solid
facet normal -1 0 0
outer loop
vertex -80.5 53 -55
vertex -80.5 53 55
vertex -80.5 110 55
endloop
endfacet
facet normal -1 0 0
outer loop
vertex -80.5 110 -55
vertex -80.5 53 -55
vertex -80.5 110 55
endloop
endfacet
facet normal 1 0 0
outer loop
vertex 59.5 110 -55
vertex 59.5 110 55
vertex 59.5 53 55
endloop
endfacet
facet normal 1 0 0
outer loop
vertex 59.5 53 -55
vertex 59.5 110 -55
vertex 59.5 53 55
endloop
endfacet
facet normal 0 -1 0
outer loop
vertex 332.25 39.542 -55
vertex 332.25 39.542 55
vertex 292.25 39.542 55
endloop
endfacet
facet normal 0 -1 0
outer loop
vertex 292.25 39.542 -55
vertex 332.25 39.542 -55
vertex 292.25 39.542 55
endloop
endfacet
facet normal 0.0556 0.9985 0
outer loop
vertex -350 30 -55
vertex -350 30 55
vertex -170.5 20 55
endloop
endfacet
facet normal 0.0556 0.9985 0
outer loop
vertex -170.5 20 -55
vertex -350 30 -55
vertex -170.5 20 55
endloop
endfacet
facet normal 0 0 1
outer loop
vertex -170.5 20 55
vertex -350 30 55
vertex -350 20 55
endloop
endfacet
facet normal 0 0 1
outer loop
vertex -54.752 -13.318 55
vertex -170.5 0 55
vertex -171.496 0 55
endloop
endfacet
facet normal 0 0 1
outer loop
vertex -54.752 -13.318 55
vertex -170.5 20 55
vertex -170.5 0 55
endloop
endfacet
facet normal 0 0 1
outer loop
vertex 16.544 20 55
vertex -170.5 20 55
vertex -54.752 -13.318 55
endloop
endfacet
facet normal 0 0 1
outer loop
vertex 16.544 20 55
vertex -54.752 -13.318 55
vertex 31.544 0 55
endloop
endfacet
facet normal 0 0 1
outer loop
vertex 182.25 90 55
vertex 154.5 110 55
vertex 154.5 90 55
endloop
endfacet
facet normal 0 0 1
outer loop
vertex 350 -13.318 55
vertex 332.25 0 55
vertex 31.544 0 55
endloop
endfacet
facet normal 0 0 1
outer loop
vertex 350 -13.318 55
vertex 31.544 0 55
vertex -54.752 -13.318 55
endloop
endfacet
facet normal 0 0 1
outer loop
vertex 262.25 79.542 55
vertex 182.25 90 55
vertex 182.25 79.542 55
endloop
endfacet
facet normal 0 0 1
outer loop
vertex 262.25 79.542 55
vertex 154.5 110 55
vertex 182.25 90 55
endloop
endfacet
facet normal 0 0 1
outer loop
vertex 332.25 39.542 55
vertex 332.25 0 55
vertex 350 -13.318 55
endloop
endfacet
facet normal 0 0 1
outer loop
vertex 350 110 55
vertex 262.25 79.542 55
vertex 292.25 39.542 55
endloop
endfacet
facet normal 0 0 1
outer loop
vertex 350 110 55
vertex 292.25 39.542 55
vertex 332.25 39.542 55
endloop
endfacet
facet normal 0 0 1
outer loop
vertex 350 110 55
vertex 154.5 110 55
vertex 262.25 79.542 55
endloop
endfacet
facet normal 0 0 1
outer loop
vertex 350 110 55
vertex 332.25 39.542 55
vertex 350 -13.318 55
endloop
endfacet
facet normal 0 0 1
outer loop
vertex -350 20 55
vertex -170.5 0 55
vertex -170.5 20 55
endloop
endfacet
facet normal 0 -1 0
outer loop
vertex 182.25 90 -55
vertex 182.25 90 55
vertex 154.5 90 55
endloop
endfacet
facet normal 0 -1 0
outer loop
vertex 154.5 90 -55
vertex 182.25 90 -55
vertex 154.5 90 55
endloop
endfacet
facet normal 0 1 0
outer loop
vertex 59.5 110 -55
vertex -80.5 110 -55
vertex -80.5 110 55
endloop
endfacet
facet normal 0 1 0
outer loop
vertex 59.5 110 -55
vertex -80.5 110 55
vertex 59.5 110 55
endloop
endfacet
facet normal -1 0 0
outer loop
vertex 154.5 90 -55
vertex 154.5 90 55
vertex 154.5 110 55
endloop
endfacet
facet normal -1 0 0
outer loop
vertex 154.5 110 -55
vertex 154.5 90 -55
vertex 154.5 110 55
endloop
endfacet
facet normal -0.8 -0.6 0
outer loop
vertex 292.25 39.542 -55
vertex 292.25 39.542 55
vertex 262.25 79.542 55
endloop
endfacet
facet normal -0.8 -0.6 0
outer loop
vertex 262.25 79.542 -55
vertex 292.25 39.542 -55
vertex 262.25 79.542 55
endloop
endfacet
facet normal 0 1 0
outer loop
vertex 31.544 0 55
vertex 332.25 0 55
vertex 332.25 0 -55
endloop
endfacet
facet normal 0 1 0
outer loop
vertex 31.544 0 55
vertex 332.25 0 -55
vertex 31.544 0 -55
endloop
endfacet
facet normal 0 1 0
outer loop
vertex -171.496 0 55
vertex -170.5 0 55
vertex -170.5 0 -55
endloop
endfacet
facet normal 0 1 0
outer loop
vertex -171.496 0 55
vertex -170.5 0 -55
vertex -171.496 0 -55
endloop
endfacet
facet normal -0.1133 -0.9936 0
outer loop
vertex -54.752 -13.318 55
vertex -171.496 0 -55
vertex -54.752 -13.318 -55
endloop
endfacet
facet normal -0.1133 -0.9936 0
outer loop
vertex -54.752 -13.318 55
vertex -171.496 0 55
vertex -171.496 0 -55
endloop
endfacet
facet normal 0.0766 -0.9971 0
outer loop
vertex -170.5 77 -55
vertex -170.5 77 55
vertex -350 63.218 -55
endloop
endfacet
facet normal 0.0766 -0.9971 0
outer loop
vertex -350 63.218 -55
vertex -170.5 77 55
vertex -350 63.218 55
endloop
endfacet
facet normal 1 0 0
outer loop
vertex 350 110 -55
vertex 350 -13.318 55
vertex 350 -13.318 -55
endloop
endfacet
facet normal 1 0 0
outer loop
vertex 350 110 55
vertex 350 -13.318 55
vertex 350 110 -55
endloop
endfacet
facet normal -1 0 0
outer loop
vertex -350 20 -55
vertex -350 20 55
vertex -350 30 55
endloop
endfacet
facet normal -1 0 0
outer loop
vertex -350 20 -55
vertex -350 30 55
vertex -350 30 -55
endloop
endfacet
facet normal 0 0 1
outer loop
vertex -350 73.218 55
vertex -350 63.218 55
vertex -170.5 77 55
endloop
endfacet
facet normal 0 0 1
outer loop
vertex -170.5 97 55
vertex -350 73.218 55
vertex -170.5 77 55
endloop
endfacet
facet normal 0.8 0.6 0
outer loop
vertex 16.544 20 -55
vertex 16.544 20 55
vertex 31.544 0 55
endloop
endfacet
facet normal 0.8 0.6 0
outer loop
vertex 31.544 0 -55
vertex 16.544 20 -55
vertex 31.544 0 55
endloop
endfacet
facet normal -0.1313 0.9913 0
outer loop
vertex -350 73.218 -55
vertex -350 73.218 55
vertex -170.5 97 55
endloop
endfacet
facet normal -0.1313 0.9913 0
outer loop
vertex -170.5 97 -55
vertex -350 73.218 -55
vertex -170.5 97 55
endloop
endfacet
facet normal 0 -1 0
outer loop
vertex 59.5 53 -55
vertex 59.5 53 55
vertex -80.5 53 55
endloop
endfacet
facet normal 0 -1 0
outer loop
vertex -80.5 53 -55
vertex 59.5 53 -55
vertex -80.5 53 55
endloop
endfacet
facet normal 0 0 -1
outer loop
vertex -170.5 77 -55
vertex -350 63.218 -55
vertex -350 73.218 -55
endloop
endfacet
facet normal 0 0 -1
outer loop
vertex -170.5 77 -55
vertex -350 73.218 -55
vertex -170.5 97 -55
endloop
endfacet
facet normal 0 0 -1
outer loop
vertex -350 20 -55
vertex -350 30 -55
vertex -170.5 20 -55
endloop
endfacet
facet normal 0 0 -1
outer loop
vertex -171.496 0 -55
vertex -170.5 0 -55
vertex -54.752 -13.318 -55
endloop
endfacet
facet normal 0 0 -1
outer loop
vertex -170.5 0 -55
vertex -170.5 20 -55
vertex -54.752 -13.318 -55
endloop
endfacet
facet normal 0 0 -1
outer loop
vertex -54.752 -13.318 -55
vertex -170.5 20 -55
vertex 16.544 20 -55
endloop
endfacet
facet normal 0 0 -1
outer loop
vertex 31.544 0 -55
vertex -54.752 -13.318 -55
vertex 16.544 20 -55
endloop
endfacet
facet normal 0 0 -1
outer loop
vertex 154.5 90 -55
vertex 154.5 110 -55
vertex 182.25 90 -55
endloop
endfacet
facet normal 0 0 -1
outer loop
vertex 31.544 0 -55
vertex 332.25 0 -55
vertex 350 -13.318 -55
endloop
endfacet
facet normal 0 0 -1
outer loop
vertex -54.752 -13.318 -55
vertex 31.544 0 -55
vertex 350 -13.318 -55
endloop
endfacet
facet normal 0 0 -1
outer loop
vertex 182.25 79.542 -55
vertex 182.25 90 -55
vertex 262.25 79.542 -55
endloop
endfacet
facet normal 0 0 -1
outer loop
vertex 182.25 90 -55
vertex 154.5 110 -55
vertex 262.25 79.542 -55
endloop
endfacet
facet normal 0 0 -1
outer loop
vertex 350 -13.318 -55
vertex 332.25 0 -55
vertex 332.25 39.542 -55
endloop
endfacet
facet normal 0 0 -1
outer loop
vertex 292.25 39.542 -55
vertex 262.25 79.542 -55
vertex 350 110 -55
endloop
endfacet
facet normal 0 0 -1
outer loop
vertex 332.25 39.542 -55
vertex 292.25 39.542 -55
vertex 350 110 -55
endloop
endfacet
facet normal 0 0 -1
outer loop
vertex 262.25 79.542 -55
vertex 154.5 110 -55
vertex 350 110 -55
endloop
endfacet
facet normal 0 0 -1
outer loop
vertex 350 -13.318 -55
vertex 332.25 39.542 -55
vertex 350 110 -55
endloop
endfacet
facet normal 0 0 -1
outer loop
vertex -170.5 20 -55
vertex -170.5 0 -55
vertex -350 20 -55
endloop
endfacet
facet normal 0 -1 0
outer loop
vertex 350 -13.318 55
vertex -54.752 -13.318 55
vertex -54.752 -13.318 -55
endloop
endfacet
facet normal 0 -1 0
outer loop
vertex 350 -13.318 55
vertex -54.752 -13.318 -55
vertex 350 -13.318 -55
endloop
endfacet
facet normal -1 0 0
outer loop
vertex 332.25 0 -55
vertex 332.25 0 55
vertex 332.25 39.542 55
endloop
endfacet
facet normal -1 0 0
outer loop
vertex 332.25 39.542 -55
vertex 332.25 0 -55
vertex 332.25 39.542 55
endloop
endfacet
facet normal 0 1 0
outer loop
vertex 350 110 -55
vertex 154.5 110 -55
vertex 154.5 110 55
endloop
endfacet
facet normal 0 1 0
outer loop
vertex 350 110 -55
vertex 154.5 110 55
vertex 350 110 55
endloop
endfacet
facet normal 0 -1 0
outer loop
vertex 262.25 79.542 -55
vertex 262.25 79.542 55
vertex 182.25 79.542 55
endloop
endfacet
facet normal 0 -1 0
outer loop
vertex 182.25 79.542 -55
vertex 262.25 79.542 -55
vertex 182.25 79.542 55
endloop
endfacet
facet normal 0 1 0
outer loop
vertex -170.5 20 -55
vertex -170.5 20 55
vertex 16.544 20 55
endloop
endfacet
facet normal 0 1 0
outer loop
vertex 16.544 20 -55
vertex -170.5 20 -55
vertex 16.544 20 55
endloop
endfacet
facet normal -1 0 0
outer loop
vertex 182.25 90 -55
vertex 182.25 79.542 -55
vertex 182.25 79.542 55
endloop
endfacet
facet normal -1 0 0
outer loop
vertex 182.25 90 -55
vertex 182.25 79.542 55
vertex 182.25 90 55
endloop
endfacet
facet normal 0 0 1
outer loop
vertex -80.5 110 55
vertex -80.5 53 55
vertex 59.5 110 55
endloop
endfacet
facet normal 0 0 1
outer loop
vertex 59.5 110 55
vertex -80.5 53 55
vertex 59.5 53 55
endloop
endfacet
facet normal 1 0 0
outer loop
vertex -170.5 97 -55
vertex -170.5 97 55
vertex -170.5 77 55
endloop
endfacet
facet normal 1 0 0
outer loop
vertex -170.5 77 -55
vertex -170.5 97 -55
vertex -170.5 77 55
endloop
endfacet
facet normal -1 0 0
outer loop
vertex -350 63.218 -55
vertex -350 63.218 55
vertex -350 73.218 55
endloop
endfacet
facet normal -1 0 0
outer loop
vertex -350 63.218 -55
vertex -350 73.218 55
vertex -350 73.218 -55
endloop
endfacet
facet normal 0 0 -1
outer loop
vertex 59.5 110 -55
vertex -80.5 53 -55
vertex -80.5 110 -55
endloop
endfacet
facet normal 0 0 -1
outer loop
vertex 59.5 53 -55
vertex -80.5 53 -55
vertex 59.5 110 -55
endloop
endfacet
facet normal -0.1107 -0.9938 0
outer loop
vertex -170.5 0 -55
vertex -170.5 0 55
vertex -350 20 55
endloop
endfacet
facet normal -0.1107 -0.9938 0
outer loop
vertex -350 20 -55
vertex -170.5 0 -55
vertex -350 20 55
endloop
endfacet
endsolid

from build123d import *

# Parameters (mm, degrees)
SKETCH1_W           = 700
SKETCH1_H           = 110
BOSS_EXTRUDE1_DEPTH = 110
CUT_EXTRUDE1_DEPTH  = 120
BOSS_EXTRUDE9_DEPTH = 55


with BuildPart() as part:
    # Sketch1 → Boss-Extrude1 (new body)
    with BuildSketch(Plane(origin=(0, 0, 0), x_dir=(1, 0, 0), z_dir=(0, 1, 0))):
        Rectangle(SKETCH1_W, SKETCH1_H)
    extrude(amount=BOSS_EXTRUDE1_DEPTH)

    # Sketch3 → Cut-Extrude1 (cut)
    with BuildSketch(Plane.XY.offset(55)):
        Polygon((262.25, 79.541692384), (182.25, 79.541692384), (182.25, 90), (154.5, 90), (154.5, 110), (59.5, 110), (59.5, 53), (-80.5, 53), (-80.5, 110), (-350, 110), (-350, 73.218467101), (-170.5, 97), (-170.5, 77), (-350, 63.218467101), (-350, 30), (-170.5, 20), (16.544278488, 20), (31.544278488, 0), (332.25, 0), (332.25, 39.541692384), (292.25, 39.541692384), align=None)
        Polygon((-350, 0), (-170.5, 0), (-350, 20), align=None)
    extrude(amount=-CUT_EXTRUDE1_DEPTH, mode=Mode.SUBTRACT)


with BuildPart() as cut_extrude1_piece_1:
    # of the separate pieces the step leaves, piece 1, a body of its own (cut_extrude1_pieces)
    add(part.part.solids().sort_by_distance((332.25, 0, -55))[0])



with BuildPart() as cut_extrude1_piece_2:
    # of the separate pieces the step leaves, piece 2, a body of its own (cut_extrude1_pieces)
    add(part.part.solids().sort_by_distance((-80.5, 110, -55))[0])


with BuildPart() as cut_extrude1_piece_3:
    # of the separate pieces the step leaves, piece 3, a body of its own (cut_extrude1_pieces)
    add(part.part.solids().sort_by_distance((-350, 20, -55))[0])


with BuildPart() as cut_extrude1_piece_4:
    # of the separate pieces the step leaves, piece 4, a body of its own (cut_extrude1_pieces)
    add(part.part.solids().sort_by_distance((-350, 63.218467101, -55))[0])


with BuildPart() as cut_extrude1_piece_1_1:
    add(cut_extrude1_piece_1.part)

    add(cut_extrude1_piece_3.part)  # Boss-Extrude9 merges Cut-Extrude1 piece 3
    # Sketch5 → Boss-Extrude9 (add, symmetric)
    with BuildSketch(Plane.XY):
        Polygon((-171.496430607, 0), (-54.75215435, -13.317944804), (350, -13.317944804), (350, 0), align=None)
    extrude(amount=BOSS_EXTRUDE9_DEPTH, both=True)


solid = Compound([cut_extrude1_piece_2.part, cut_extrude1_piece_4.part, cut_extrude1_piece_1_1.part])
